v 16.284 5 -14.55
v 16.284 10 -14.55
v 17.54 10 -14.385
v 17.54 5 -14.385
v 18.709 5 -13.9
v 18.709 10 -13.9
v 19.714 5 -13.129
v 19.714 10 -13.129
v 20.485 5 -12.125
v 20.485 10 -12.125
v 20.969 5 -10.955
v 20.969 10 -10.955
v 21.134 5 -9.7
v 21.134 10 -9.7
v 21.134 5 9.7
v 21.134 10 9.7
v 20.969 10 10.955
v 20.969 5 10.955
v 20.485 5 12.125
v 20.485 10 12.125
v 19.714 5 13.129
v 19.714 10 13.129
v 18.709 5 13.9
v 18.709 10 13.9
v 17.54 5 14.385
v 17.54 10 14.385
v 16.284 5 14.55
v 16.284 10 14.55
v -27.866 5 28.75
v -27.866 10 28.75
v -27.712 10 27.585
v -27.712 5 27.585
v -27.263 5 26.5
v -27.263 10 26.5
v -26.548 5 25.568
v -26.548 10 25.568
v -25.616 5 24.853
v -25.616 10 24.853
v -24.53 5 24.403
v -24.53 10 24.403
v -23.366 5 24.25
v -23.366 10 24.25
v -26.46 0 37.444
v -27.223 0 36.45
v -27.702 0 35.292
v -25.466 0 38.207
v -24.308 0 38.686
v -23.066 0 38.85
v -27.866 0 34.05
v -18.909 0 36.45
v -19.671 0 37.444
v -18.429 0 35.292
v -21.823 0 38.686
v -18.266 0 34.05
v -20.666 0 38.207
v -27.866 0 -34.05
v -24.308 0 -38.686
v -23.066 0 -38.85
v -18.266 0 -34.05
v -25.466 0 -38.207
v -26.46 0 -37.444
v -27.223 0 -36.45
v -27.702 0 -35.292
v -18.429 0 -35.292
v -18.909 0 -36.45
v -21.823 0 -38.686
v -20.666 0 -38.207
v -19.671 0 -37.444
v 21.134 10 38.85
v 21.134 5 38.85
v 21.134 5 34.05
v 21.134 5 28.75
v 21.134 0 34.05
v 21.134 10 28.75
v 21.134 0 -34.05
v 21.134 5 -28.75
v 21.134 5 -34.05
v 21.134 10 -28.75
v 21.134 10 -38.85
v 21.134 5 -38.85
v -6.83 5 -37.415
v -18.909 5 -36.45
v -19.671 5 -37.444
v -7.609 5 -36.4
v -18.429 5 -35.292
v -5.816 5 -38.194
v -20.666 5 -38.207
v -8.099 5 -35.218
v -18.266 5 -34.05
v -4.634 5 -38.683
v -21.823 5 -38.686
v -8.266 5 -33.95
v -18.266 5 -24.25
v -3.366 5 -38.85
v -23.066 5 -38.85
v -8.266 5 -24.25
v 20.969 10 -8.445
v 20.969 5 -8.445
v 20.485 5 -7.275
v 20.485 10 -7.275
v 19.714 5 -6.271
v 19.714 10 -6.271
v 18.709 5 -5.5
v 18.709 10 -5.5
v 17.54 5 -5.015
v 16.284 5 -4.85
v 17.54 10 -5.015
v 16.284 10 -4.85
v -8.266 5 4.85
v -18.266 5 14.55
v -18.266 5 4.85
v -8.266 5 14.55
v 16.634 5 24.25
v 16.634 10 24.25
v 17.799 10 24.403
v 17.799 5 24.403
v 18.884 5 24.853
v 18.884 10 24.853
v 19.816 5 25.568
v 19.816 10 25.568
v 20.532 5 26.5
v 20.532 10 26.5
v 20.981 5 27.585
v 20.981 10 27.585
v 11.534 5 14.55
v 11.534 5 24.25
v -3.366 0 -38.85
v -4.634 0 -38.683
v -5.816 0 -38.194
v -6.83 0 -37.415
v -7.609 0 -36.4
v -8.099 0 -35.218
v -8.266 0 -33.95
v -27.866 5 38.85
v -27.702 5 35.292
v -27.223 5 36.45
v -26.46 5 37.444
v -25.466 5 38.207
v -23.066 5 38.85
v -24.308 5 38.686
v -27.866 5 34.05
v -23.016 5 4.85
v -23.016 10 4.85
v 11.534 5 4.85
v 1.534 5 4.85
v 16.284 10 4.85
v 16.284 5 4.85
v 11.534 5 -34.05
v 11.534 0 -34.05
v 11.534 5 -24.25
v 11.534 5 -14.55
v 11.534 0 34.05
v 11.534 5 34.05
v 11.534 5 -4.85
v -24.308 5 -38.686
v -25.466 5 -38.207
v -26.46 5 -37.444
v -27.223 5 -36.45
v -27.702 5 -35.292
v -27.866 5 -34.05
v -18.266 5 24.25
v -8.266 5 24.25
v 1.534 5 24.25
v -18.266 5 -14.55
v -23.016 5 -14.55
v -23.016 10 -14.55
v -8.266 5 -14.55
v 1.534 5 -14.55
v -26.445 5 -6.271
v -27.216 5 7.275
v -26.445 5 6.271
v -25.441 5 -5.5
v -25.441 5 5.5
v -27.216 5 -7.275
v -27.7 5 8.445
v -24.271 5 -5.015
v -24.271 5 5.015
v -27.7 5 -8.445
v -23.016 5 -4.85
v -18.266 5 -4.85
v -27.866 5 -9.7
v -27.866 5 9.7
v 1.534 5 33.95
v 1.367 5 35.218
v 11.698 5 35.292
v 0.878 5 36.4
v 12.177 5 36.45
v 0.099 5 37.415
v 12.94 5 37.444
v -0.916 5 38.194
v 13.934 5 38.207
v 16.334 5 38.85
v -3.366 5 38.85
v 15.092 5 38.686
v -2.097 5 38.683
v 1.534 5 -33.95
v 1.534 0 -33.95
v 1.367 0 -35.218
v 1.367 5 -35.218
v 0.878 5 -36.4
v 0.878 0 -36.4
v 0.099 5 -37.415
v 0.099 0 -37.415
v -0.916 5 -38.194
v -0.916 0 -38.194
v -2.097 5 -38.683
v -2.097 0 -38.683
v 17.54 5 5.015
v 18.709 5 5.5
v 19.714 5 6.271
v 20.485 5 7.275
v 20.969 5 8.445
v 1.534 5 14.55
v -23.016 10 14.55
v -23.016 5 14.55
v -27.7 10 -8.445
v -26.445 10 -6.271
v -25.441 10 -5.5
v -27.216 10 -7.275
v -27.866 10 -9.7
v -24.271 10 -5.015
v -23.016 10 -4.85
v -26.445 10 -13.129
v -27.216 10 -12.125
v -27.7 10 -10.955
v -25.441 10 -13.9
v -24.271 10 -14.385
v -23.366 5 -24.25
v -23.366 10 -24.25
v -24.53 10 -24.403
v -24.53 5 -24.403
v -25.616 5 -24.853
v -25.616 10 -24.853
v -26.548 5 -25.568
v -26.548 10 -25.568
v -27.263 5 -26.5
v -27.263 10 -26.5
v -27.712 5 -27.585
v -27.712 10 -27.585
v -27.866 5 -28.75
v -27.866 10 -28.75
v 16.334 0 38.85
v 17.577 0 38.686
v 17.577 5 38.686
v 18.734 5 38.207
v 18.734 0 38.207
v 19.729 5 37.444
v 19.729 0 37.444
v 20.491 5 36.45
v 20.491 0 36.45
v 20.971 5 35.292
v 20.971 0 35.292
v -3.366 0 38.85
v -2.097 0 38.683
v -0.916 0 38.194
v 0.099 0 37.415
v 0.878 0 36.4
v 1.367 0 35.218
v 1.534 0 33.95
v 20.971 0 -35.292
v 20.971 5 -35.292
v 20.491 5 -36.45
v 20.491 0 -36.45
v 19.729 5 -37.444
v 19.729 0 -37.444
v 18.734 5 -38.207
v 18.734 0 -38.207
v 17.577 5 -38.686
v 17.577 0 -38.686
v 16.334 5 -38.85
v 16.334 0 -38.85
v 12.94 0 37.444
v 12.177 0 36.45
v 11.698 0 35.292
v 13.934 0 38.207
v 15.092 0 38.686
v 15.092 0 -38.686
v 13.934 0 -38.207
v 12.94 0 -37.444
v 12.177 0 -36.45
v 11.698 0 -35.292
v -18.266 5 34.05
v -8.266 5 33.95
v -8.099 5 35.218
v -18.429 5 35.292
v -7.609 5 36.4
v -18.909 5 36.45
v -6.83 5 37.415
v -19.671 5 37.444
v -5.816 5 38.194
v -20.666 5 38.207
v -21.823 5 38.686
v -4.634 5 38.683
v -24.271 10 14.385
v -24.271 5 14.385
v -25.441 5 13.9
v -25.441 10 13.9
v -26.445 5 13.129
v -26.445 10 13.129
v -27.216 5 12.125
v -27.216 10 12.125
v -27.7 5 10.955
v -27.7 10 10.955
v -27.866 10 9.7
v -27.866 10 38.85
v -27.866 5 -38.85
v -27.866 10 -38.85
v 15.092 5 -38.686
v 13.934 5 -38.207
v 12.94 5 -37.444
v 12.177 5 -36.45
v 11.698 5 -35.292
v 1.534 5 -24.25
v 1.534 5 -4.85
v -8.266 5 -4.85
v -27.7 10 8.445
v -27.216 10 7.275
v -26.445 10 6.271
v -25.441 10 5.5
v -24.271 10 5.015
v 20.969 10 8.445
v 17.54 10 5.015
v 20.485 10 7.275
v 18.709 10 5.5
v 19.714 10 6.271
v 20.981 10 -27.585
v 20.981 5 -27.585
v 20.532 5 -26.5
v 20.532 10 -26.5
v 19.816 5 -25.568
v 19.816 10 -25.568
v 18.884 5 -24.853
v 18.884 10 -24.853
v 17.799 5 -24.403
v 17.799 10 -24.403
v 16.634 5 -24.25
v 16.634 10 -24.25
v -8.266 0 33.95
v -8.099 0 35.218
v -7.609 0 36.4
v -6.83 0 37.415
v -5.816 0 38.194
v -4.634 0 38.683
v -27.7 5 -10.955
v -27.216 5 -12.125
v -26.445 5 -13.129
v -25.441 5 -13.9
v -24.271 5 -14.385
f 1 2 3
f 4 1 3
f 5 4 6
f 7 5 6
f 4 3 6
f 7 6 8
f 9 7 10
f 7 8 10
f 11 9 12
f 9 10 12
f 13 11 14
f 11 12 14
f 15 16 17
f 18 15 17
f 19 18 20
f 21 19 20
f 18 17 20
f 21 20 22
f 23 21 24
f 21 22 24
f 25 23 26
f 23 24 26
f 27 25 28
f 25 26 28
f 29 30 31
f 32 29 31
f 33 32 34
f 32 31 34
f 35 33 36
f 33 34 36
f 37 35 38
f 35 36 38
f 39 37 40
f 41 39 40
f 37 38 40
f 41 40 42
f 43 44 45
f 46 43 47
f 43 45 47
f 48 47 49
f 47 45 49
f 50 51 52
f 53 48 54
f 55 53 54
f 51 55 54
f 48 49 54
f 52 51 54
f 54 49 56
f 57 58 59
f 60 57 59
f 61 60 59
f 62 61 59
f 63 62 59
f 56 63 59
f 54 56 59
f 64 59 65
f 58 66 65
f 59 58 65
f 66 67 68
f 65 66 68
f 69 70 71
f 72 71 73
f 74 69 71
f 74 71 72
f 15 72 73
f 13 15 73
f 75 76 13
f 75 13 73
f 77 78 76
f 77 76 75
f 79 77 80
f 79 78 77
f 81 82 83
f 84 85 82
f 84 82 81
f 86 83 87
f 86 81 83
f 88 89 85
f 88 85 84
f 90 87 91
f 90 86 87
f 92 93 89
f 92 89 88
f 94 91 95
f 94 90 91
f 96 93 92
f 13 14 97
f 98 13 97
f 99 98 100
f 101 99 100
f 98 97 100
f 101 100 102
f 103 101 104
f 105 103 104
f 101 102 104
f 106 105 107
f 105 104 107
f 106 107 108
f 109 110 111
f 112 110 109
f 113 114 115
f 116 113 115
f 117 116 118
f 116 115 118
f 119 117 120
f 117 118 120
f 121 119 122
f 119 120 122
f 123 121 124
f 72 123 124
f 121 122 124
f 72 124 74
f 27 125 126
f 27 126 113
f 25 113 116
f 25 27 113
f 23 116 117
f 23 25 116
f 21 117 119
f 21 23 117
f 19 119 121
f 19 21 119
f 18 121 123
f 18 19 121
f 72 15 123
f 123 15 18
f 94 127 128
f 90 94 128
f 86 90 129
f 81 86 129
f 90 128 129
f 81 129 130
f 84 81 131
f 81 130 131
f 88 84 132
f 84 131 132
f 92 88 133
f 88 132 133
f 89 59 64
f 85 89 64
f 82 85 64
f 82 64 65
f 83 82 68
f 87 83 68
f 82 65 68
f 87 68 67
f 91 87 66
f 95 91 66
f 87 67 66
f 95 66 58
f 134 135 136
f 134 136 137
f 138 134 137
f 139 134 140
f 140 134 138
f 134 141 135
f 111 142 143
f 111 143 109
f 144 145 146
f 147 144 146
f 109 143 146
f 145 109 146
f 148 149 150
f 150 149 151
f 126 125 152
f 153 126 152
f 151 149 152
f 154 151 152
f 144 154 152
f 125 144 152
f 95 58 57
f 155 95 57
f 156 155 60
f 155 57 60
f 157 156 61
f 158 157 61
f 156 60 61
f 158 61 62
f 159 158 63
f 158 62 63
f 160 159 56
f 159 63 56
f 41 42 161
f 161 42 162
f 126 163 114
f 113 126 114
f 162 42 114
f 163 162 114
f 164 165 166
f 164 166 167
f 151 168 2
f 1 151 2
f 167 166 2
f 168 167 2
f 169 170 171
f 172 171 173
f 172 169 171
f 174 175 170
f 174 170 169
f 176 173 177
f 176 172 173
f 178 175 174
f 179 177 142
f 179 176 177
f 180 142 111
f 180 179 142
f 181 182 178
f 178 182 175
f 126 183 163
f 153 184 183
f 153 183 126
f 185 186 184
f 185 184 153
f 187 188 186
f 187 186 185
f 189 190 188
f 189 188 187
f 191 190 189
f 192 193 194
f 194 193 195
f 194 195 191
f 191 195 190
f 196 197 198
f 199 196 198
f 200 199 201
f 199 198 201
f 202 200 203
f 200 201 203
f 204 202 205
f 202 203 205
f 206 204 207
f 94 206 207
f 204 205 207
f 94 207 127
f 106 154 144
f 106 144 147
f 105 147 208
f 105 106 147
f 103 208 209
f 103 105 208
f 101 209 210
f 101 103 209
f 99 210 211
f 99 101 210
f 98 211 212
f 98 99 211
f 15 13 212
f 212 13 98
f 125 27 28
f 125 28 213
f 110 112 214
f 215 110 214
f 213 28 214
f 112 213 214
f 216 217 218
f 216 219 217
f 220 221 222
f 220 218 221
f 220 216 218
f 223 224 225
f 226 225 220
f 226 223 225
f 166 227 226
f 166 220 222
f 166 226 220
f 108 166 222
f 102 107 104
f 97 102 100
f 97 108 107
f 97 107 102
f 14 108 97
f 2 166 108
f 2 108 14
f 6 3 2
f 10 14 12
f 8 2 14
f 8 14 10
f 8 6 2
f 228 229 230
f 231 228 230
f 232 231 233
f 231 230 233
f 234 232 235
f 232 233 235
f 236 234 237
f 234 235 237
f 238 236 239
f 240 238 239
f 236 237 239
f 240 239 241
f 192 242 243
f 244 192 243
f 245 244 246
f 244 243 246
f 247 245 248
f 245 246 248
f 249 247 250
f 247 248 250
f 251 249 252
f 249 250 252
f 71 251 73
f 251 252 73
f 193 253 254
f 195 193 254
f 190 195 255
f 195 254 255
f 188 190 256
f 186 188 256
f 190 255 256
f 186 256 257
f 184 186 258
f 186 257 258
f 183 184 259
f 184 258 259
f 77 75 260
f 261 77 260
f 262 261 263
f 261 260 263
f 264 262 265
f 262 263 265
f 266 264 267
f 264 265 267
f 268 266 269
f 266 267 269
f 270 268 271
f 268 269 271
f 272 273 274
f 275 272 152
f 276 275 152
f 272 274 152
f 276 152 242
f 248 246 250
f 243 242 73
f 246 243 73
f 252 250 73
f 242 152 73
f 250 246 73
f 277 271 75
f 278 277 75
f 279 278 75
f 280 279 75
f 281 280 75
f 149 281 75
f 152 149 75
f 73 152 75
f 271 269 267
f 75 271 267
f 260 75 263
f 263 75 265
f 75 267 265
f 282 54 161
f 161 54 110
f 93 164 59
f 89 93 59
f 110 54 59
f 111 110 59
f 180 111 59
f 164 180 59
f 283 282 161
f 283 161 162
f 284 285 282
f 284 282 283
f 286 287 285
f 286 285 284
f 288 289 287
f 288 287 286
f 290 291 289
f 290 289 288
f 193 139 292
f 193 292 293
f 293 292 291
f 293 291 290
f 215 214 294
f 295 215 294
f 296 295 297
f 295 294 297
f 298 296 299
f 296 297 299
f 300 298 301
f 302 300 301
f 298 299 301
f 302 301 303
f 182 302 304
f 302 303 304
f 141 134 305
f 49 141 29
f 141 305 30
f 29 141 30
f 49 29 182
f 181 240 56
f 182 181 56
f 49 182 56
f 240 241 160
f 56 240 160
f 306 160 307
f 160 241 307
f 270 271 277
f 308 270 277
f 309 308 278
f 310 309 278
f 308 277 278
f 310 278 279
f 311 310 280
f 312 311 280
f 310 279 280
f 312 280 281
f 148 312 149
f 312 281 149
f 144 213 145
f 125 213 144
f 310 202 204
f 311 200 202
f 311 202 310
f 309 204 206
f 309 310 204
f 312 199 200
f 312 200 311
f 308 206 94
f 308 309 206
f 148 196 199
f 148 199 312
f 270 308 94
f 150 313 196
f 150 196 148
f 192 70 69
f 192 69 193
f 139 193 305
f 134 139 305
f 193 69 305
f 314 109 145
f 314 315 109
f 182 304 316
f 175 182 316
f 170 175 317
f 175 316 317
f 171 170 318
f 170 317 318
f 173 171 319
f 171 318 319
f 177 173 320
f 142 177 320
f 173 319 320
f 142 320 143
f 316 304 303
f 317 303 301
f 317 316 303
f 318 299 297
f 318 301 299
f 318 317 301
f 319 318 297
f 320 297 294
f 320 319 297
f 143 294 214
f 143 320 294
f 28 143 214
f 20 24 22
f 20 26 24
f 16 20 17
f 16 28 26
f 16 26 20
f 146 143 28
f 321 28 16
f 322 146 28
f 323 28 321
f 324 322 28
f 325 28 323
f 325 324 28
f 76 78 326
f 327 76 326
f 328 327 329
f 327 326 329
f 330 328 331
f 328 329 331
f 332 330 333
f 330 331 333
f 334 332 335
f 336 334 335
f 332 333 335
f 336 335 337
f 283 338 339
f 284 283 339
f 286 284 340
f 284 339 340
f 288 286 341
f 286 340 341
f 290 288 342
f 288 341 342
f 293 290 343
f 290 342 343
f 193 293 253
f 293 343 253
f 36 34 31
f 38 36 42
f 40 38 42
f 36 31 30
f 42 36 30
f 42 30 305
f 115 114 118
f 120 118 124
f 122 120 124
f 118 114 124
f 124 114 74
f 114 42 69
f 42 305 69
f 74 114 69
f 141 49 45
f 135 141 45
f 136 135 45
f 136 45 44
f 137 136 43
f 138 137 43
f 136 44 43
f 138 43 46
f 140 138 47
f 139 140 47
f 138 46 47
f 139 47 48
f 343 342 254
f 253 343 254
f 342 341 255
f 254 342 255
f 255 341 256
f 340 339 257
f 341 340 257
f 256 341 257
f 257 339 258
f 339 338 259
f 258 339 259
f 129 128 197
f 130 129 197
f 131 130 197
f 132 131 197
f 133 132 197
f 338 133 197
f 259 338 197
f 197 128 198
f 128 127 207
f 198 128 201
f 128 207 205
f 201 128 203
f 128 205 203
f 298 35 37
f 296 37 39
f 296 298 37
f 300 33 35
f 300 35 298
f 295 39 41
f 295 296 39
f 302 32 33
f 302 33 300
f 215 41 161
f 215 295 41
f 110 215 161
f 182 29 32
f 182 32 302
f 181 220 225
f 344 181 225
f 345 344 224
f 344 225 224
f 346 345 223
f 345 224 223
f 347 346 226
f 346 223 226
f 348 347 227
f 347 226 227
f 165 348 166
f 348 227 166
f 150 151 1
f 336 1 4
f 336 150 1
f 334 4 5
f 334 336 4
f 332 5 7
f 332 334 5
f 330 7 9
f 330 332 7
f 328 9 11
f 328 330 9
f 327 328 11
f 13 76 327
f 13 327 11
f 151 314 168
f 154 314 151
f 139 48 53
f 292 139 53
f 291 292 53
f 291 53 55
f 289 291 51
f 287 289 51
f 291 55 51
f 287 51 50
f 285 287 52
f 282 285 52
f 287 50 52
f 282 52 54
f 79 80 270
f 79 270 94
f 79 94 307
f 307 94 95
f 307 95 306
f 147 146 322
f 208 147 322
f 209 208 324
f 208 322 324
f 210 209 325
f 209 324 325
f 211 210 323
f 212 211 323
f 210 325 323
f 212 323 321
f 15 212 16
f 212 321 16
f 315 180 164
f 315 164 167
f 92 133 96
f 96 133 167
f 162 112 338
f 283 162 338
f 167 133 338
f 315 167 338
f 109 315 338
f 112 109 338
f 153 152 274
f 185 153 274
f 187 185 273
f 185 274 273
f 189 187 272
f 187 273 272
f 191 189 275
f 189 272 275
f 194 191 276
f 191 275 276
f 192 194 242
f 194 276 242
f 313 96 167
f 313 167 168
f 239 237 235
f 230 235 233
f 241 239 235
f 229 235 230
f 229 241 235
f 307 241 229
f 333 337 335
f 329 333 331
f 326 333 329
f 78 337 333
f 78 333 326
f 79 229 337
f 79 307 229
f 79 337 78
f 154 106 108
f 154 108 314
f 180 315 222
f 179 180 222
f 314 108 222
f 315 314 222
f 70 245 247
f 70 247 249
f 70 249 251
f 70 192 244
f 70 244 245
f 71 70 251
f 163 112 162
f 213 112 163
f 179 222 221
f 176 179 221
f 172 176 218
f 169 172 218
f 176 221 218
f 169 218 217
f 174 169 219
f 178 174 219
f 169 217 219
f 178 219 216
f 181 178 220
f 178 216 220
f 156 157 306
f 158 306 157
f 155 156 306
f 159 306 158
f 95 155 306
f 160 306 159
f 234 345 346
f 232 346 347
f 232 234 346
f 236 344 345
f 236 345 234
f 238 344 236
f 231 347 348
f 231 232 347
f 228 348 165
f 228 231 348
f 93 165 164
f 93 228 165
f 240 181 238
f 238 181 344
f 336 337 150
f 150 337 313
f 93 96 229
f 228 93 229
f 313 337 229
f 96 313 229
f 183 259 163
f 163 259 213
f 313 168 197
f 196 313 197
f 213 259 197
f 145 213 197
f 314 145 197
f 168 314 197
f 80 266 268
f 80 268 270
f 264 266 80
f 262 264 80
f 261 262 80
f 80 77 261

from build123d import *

# Parameters (mm, degrees)
BOSS_EXTRUDE1_DEPTH      = 10
CUT_EXTRUDE3_DEPTH       = 5
BOSS_EXTRUDE6_DEPTH      = 5
BOSS_EXTRUDE6_DEPTH_BACK = 10
SKETCH5_W                = 4.5
SKETCH5_H                = 5
CUT_EXTRUDE5_DEPTH       = 60
CUT_EXTRUDE7_DEPTH       = 5


with BuildPart() as part:
    # Sketch1 → Boss-Extrude1 (new body)
    with BuildSketch(Plane(origin=(0, 0, 0), x_dir=(1, 0, 0), z_dir=(0, 1, 0))):
        with BuildLine():
            Line((-23.3656, -38.85), (16.6344, -38.85))
            ThreePointArc((16.6344, -38.85), (19.816380515, -37.531980515), (21.1344, -34.35))
            Line((21.1344, -34.35), (21.1344, 34.35))
            ThreePointArc((21.1344, 34.35), (19.816380515, 37.531980515), (16.6344, 38.85))
            Line((16.6344, 38.85), (-23.3656, 38.85))
            ThreePointArc((-23.3656, 38.85), (-26.547580515, 37.531980515), (-27.8656, 34.35))
            Line((-27.8656, 34.35), (-27.8656, -34.35))
            ThreePointArc((-27.8656, -34.35), (-26.547580515, -37.531980515), (-23.3656, -38.85))
        make_face()
    extrude(amount=BOSS_EXTRUDE1_DEPTH)

    # Sketch2 → Cut-Extrude3 (cut)
    with BuildSketch(Plane(origin=(0, 10, 0), x_dir=(1, 0, 0), z_dir=(0, 1, 0))):
        with BuildLine():
            Line((-23.0156, -14.55), (-27.8656, -14.55))
            Line((-27.8656, -14.55), (-27.8656, -28.75))
            ThreePointArc((-27.8656, -28.75), (-26.547580515, -25.568019485), (-23.3656, -24.25))
            Line((-23.3656, -24.25), (16.6344, -24.25))
            ThreePointArc((16.6344, -24.25), (19.816380515, -25.568019485), (21.1344, -28.75))
            Line((21.1344, -28.75), (21.1344, -14.55))
            Line((21.1344, -14.55), (16.2844, -14.55))
            Line((16.2844, -14.55), (-23.0156, -14.55))
        make_face()
        with BuildLine():
            ThreePointArc((-23.0156, -14.55), (-26.445067903, -13.129467874), (-27.8656, -9.699999958))
            Line((-27.8656, -9.699999958), (-27.8656, -14.55))
            Line((-27.8656, -14.55), (-23.0156, -14.55))
        make_face()
        with BuildLine():
            Line((21.1344, -14.55), (21.1344, -9.7))
            ThreePointArc((21.1344, -9.7), (19.713867889, -13.129467889), (16.2844, -14.55))
            Line((16.2844, -14.55), (21.1344, -14.55))
        make_face()
        with BuildLine():
            Line((21.1344, -9.7), (21.1344, -4.85))
            Line((21.1344, -4.85), (16.28440001, -4.85))
            ThreePointArc((16.28440001, -4.85), (19.713867892, -6.270532115), (21.1344, -9.7))
        make_face()
        with BuildLine():
            Line((-23.0156, -4.85), (-27.8656, -4.85))
            Line((-27.8656, -4.85), (-27.8656, -9.699999958))
            ThreePointArc((-27.8656, -9.699999958), (-26.445067874, -6.270532097), (-23.0156, -4.85))
        make_face()
        Polygon((-23.0156, 4.85), (-27.8656, 4.85), (-27.8656, -4.85), (-23.0156, -4.85), (16.28440001, -4.85), (21.1344, -4.85), (21.1344, 4.85), (16.284399974, 4.85), align=None)
        with BuildLine():
            ThreePointArc((-23.0156, 4.85), (-26.445067902, 6.270532124), (-27.8656, 9.700000036))
            Line((-27.8656, 9.700000036), (-27.8656, 4.85))
            Line((-27.8656, 4.85), (-23.0156, 4.85))
        make_face()
        with BuildLine():
            Line((21.1344, 4.85), (21.1344, 9.7))
            ThreePointArc((21.1344, 9.7), (19.71386788, 6.270532102), (16.284399974, 4.85))
            Line((16.284399974, 4.85), (21.1344, 4.85))
        make_face()
        with BuildLine():
            Line((-23.015600011, 14.55), (-27.8656, 14.55))
            Line((-27.8656, 14.55), (-27.8656, 9.700000036))
            ThreePointArc((-27.8656, 9.700000036), (-26.44506788, 13.129467898), (-23.015600011, 14.55))
        make_face()
        with BuildLine():
            Line((16.6344, 24.25), (-23.3656, 24.25))
            ThreePointArc((-23.3656, 24.25), (-26.547580515, 25.568019485), (-27.8656, 28.75))
            Line((-27.8656, 28.75), (-27.8656, 14.55))
            Line((-27.8656, 14.55), (-23.015600011, 14.55))
            Line((-23.015600011, 14.55), (16.2844, 14.55))
            Line((16.2844, 14.55), (21.1344, 14.55))
            Line((21.1344, 14.55), (21.1344, 28.75))
            ThreePointArc((21.1344, 28.75), (19.816380515, 25.568019485), (16.6344, 24.25))
        make_face()
        with BuildLine():
            Line((21.1344, 9.7), (21.1344, 14.55))
            Line((21.1344, 14.55), (16.2844, 14.55))
            ThreePointArc((16.2844, 14.55), (19.713867889, 13.129467889), (21.1344, 9.7))
        make_face()
    extrude(amount=-CUT_EXTRUDE3_DEPTH, mode=Mode.SUBTRACT)

    # Sketch4 → Boss-Extrude6 (add, two sides: drawn at the far end of the back side and taken through both)
    with BuildSketch(Plane.XZ.offset(-BOSS_EXTRUDE6_DEPTH_BACK)):
        with BuildLine():
            ThreePointArc((-27.8656, 34.35), (-26.547580515, 37.531980515), (-23.3656, 38.85))
            Line((-23.3656, 38.85), (-27.8656, 38.85))
            Line((-27.8656, 38.85), (-27.8656, 34.35))
        make_face()
        with BuildLine():
            Line((-23.3656, 35.615611346), (-23.3656, 38.85))
            ThreePointArc((-23.3656, 38.85), (-26.547580515, 37.531980515), (-27.8656, 34.35))
            Line((-27.8656, 34.35), (-27.8656, 34.176611106))
            Line((-27.8656, 34.176611106), (-23.3656, 35.615611346))
        make_face()
        with BuildLine():
            Line((17.428758808, 36.847416441), (16.6344, 38.85))
            ThreePointArc((16.6344, 38.85), (19.816380515, 37.531980515), (21.1344, 34.35))
            Line((21.1344, 34.35), (17.428758808, 36.847416441))
        make_face()
        with BuildLine():
            Line((21.1344, 38.85), (21.1344, 34.35))
            ThreePointArc((21.1344, 34.35), (19.816380515, 37.531980515), (16.6344, 38.85))
            Line((16.6344, 38.85), (21.1344, 38.85))
        make_face()
        with BuildLine():
            Line((16.6344, -34.745010915), (21.1344, -34.35))
            ThreePointArc((21.1344, -34.35), (19.816380515, -37.531980515), (16.6344, -38.85))
            Line((16.6344, -38.85), (16.6344, -34.745010915))
        make_face()
        with BuildLine():
            Line((16.6344, -38.85), (21.1344, -38.85))
            Line((21.1344, -38.85), (21.1344, -34.35))
            ThreePointArc((21.1344, -34.35), (19.816380515, -37.531980515), (16.6344, -38.85))
        make_face()
        with BuildLine():
            Line((-23.3656, -38.85), (-23.156696732, -35.585785164))
            Line((-23.156696732, -35.585785164), (-27.8656, -34.35))
            ThreePointArc((-27.8656, -34.35), (-26.547580515, -37.531980515), (-23.3656, -38.85))
        make_face()
        with BuildLine():
            Line((-27.8656, -34.35), (-27.8656, -38.85))
            Line((-27.8656, -38.85), (-23.3656, -38.85))
            ThreePointArc((-23.3656, -38.85), (-26.547580515, -37.531980515), (-27.8656, -34.35))
        make_face()
    extrude(amount=BOSS_EXTRUDE6_DEPTH + BOSS_EXTRUDE6_DEPTH_BACK)

    # Sketch5 → Cut-Extrude5 (cut)
    with BuildSketch(Plane(origin=(21.1344, 0, 0), x_dir=(0, 0, -1), z_dir=(1, 0, 0))):
        Polygon((34.35, 0), (-34.35, 0), (-34.35, -5), (-38.85, -5), (-38.85, -11.467862175), (41.584838498, -11.467862175), (41.584838498, 0), (38.85, 0), (38.85, -5), (34.35, -5), align=None)
        with Locations((36.6, -2.5)):
            Rectangle(SKETCH5_W, SKETCH5_H)
        with Locations((-36.6, -2.5)):
            Rectangle(SKETCH5_W, SKETCH5_H)
    extrude(amount=-CUT_EXTRUDE5_DEPTH, mode=Mode.SUBTRACT)

    # Sketch6 → Cut-Extrude7 (cut)
    with BuildSketch(Plane.XZ):
        with BuildLine():
            ThreePointArc((-27.8656, 34.05), (-26.45971255, 37.44411255), (-23.0656, 38.85))
            Line((-23.0656, 38.85), (-27.8656, 38.85))
            Line((-27.8656, 38.85), (-27.8656, 34.05))
        make_face()
        with BuildLine():
            Line((-18.2656, 34.05), (-18.2656, 38.85))
            Line((-18.2656, 38.85), (-23.0656, 38.85))
            ThreePointArc((-23.0656, 38.85), (-19.67148745, 37.44411255), (-18.2656, 34.05))
        make_face()
        Polygon((-8.2656, 38.85), (-18.2656, 38.85), (-18.2656, 34.05), (-18.2656, -34.05), (-18.2656, -38.85), (-8.2656, -38.85), (-8.2656, -33.950000026), (-8.2656, 33.95), align=None)
        with BuildLine():
            Line((-3.365599985, 38.85), (-8.2656, 38.85))
            Line((-8.2656, 38.85), (-8.2656, 33.95))
            ThreePointArc((-8.2656, 33.95), (-6.830423222, 37.414823233), (-3.365599985, 38.85))
        make_face()
        with BuildLine():
            Line((1.5344, 38.85), (-3.365599985, 38.85))
            ThreePointArc((-3.365599985, 38.85), (0.099223233, 37.414823222), (1.5344, 33.95))
            Line((1.5344, 33.95), (1.5344, 38.85))
        make_face()
        Polygon((1.5344, 38.85), (1.5344, 33.95), (1.5344, -33.95), (1.5344, -38.85), (11.5344, -38.85), (11.5344, -34.050000018), (11.5344, 34.05), (11.5344, 38.85), align=None)
        with BuildLine():
            Line((16.3344, 38.85), (11.5344, 38.85))
            Line((11.5344, 38.85), (11.5344, 34.05))
            ThreePointArc((11.5344, 34.05), (12.94028745, 37.44411255), (16.3344, 38.85))
        make_face()
        with BuildLine():
            Line((21.1344, 38.85), (16.3344, 38.85))
            ThreePointArc((16.3344, 38.85), (19.72851255, 37.44411255), (21.1344, 34.05))
            Line((21.1344, 34.05), (21.1344, 38.85))
        make_face()
        with BuildLine():
            ThreePointArc((21.1344, -34.05), (19.72851255, -37.44411255), (16.3344, -38.85))
            Line((16.3344, -38.85), (21.1344, -38.85))
            Line((21.1344, -38.85), (21.1344, -34.05))
        make_face()
        with BuildLine():
            Line((11.5344, -34.050000018), (11.5344, -38.85))
            Line((11.5344, -38.85), (16.3344, -38.85))
            ThreePointArc((16.3344, -38.85), (12.940287457, -37.444112556), (11.5344, -34.050000018))
        make_face()
        with BuildLine():
            Line((1.5344, -38.85), (1.5344, -33.95))
            ThreePointArc((1.5344, -33.95), (0.099223245, -37.414823211), (-3.365599951, -38.85))
            Line((-3.365599951, -38.85), (1.5344, -38.85))
        make_face()
        with BuildLine():
            ThreePointArc((-3.365599951, -38.85), (-6.830423201, -37.414823254), (-8.2656, -33.950000026))
            Line((-8.2656, -33.950000026), (-8.2656, -38.85))
            Line((-8.2656, -38.85), (-3.365599951, -38.85))
        make_face()
        with BuildLine():
            Line((-18.2656, -38.85), (-18.2656, -34.05))
            ThreePointArc((-18.2656, -34.05), (-19.67148745, -37.44411255), (-23.0656, -38.85))
            Line((-23.0656, -38.85), (-18.2656, -38.85))
        make_face()
        with BuildLine():
            ThreePointArc((-23.0656, -38.85), (-26.459712556, -37.444112543), (-27.8656, -34.049999982))
            Line((-27.8656, -34.049999982), (-27.8656, -38.85))
            Line((-27.8656, -38.85), (-23.0656, -38.85))
        make_face()
    extrude(amount=-CUT_EXTRUDE7_DEPTH, mode=Mode.SUBTRACT)


solid = part.part
